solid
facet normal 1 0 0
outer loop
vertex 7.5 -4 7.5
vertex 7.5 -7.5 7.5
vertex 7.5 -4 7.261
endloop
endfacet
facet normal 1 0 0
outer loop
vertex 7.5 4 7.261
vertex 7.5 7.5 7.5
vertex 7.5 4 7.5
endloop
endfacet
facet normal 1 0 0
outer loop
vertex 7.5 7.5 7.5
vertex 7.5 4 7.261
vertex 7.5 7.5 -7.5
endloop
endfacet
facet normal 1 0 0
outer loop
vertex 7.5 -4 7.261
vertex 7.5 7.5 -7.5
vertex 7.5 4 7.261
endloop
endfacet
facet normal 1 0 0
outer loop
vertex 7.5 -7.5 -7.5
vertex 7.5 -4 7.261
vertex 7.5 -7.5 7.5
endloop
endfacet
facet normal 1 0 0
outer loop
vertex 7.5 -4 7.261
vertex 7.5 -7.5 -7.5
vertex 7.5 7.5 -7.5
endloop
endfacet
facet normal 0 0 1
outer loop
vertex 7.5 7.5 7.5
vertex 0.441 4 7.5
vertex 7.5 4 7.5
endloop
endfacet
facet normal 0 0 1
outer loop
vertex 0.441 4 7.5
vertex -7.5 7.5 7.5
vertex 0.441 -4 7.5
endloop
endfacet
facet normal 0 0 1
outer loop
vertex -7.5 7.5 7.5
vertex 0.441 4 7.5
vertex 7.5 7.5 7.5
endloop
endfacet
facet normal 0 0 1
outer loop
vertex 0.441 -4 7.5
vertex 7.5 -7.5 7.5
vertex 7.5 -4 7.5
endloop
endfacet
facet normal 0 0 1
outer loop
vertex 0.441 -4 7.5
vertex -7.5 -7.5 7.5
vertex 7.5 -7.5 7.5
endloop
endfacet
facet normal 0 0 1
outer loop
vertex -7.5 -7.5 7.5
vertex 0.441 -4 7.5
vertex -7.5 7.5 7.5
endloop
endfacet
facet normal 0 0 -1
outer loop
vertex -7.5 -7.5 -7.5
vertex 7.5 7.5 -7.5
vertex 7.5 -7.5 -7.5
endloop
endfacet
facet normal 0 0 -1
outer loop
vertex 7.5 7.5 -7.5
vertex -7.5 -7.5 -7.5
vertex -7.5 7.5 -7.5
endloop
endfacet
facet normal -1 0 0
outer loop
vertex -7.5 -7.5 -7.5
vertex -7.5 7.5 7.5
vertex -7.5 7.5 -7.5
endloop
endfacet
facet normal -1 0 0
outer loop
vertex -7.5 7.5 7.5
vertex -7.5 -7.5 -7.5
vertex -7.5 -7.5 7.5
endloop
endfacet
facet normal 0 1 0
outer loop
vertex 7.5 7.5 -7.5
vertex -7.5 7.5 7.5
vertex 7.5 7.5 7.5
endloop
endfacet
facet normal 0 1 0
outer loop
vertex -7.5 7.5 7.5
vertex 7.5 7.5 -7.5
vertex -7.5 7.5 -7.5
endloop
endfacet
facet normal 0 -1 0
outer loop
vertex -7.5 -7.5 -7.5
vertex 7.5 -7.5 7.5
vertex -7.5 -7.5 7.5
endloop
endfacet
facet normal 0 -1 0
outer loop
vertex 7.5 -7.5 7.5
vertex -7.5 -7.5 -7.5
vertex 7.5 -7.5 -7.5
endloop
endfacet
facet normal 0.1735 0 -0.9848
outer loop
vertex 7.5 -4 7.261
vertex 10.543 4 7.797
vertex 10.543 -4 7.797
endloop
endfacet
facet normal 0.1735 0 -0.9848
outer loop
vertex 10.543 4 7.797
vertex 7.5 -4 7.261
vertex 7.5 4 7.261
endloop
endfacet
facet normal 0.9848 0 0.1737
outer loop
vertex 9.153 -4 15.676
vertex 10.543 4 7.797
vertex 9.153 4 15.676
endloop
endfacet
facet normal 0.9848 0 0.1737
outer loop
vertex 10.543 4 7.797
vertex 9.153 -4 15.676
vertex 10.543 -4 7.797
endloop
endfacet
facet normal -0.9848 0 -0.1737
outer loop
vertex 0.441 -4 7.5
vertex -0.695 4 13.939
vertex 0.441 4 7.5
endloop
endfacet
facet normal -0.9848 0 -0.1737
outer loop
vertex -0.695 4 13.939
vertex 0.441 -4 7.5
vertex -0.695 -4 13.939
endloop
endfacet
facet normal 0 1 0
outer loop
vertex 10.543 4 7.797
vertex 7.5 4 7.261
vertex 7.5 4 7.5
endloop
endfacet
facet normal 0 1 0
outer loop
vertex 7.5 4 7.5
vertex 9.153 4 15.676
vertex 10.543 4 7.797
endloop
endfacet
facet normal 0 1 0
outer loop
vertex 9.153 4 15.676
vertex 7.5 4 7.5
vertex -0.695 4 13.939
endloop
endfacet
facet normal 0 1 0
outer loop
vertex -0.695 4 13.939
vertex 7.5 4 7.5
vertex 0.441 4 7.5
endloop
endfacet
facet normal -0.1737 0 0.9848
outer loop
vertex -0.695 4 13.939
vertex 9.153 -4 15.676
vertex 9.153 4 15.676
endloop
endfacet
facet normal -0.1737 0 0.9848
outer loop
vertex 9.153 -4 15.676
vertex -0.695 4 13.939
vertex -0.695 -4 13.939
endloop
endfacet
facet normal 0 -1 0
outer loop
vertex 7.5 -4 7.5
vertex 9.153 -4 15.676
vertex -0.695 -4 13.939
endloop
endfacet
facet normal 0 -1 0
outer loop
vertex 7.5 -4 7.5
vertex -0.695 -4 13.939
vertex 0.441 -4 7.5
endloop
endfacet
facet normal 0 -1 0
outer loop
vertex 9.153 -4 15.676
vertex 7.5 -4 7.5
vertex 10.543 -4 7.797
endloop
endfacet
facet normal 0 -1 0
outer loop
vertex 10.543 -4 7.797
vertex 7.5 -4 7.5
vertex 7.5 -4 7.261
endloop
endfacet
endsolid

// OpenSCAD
// A tilted box landing on a cube, so that some creases of the junction fit the
// radius and their neighbours do not. All planar: no tessellation anywhere in
// the junction, so what it measures is the refusal path alone.
//
// The size gate refuses one concave crease at [7.5, 4, 7.44] (the blend leaves
// the surface it is meant to meet by 0.052) and four convex creases around
// [7.5, -4, 7.261] (crowding), while the cube's own top-front edge is built. The
// built bead therefore runs into a vertex a refused crease also leaves, which is
// A3's case: the refusal must not leave that bead truncated and open.
FNSET = 0; $fn = FNSET;
R = 0.5;
union() {
    cube(15, center = true);
    translate([0, 0, 10]) rotate([0, 80, 0]) translate([-4, -4, 0]) cube([8, 8, 10]);
}
